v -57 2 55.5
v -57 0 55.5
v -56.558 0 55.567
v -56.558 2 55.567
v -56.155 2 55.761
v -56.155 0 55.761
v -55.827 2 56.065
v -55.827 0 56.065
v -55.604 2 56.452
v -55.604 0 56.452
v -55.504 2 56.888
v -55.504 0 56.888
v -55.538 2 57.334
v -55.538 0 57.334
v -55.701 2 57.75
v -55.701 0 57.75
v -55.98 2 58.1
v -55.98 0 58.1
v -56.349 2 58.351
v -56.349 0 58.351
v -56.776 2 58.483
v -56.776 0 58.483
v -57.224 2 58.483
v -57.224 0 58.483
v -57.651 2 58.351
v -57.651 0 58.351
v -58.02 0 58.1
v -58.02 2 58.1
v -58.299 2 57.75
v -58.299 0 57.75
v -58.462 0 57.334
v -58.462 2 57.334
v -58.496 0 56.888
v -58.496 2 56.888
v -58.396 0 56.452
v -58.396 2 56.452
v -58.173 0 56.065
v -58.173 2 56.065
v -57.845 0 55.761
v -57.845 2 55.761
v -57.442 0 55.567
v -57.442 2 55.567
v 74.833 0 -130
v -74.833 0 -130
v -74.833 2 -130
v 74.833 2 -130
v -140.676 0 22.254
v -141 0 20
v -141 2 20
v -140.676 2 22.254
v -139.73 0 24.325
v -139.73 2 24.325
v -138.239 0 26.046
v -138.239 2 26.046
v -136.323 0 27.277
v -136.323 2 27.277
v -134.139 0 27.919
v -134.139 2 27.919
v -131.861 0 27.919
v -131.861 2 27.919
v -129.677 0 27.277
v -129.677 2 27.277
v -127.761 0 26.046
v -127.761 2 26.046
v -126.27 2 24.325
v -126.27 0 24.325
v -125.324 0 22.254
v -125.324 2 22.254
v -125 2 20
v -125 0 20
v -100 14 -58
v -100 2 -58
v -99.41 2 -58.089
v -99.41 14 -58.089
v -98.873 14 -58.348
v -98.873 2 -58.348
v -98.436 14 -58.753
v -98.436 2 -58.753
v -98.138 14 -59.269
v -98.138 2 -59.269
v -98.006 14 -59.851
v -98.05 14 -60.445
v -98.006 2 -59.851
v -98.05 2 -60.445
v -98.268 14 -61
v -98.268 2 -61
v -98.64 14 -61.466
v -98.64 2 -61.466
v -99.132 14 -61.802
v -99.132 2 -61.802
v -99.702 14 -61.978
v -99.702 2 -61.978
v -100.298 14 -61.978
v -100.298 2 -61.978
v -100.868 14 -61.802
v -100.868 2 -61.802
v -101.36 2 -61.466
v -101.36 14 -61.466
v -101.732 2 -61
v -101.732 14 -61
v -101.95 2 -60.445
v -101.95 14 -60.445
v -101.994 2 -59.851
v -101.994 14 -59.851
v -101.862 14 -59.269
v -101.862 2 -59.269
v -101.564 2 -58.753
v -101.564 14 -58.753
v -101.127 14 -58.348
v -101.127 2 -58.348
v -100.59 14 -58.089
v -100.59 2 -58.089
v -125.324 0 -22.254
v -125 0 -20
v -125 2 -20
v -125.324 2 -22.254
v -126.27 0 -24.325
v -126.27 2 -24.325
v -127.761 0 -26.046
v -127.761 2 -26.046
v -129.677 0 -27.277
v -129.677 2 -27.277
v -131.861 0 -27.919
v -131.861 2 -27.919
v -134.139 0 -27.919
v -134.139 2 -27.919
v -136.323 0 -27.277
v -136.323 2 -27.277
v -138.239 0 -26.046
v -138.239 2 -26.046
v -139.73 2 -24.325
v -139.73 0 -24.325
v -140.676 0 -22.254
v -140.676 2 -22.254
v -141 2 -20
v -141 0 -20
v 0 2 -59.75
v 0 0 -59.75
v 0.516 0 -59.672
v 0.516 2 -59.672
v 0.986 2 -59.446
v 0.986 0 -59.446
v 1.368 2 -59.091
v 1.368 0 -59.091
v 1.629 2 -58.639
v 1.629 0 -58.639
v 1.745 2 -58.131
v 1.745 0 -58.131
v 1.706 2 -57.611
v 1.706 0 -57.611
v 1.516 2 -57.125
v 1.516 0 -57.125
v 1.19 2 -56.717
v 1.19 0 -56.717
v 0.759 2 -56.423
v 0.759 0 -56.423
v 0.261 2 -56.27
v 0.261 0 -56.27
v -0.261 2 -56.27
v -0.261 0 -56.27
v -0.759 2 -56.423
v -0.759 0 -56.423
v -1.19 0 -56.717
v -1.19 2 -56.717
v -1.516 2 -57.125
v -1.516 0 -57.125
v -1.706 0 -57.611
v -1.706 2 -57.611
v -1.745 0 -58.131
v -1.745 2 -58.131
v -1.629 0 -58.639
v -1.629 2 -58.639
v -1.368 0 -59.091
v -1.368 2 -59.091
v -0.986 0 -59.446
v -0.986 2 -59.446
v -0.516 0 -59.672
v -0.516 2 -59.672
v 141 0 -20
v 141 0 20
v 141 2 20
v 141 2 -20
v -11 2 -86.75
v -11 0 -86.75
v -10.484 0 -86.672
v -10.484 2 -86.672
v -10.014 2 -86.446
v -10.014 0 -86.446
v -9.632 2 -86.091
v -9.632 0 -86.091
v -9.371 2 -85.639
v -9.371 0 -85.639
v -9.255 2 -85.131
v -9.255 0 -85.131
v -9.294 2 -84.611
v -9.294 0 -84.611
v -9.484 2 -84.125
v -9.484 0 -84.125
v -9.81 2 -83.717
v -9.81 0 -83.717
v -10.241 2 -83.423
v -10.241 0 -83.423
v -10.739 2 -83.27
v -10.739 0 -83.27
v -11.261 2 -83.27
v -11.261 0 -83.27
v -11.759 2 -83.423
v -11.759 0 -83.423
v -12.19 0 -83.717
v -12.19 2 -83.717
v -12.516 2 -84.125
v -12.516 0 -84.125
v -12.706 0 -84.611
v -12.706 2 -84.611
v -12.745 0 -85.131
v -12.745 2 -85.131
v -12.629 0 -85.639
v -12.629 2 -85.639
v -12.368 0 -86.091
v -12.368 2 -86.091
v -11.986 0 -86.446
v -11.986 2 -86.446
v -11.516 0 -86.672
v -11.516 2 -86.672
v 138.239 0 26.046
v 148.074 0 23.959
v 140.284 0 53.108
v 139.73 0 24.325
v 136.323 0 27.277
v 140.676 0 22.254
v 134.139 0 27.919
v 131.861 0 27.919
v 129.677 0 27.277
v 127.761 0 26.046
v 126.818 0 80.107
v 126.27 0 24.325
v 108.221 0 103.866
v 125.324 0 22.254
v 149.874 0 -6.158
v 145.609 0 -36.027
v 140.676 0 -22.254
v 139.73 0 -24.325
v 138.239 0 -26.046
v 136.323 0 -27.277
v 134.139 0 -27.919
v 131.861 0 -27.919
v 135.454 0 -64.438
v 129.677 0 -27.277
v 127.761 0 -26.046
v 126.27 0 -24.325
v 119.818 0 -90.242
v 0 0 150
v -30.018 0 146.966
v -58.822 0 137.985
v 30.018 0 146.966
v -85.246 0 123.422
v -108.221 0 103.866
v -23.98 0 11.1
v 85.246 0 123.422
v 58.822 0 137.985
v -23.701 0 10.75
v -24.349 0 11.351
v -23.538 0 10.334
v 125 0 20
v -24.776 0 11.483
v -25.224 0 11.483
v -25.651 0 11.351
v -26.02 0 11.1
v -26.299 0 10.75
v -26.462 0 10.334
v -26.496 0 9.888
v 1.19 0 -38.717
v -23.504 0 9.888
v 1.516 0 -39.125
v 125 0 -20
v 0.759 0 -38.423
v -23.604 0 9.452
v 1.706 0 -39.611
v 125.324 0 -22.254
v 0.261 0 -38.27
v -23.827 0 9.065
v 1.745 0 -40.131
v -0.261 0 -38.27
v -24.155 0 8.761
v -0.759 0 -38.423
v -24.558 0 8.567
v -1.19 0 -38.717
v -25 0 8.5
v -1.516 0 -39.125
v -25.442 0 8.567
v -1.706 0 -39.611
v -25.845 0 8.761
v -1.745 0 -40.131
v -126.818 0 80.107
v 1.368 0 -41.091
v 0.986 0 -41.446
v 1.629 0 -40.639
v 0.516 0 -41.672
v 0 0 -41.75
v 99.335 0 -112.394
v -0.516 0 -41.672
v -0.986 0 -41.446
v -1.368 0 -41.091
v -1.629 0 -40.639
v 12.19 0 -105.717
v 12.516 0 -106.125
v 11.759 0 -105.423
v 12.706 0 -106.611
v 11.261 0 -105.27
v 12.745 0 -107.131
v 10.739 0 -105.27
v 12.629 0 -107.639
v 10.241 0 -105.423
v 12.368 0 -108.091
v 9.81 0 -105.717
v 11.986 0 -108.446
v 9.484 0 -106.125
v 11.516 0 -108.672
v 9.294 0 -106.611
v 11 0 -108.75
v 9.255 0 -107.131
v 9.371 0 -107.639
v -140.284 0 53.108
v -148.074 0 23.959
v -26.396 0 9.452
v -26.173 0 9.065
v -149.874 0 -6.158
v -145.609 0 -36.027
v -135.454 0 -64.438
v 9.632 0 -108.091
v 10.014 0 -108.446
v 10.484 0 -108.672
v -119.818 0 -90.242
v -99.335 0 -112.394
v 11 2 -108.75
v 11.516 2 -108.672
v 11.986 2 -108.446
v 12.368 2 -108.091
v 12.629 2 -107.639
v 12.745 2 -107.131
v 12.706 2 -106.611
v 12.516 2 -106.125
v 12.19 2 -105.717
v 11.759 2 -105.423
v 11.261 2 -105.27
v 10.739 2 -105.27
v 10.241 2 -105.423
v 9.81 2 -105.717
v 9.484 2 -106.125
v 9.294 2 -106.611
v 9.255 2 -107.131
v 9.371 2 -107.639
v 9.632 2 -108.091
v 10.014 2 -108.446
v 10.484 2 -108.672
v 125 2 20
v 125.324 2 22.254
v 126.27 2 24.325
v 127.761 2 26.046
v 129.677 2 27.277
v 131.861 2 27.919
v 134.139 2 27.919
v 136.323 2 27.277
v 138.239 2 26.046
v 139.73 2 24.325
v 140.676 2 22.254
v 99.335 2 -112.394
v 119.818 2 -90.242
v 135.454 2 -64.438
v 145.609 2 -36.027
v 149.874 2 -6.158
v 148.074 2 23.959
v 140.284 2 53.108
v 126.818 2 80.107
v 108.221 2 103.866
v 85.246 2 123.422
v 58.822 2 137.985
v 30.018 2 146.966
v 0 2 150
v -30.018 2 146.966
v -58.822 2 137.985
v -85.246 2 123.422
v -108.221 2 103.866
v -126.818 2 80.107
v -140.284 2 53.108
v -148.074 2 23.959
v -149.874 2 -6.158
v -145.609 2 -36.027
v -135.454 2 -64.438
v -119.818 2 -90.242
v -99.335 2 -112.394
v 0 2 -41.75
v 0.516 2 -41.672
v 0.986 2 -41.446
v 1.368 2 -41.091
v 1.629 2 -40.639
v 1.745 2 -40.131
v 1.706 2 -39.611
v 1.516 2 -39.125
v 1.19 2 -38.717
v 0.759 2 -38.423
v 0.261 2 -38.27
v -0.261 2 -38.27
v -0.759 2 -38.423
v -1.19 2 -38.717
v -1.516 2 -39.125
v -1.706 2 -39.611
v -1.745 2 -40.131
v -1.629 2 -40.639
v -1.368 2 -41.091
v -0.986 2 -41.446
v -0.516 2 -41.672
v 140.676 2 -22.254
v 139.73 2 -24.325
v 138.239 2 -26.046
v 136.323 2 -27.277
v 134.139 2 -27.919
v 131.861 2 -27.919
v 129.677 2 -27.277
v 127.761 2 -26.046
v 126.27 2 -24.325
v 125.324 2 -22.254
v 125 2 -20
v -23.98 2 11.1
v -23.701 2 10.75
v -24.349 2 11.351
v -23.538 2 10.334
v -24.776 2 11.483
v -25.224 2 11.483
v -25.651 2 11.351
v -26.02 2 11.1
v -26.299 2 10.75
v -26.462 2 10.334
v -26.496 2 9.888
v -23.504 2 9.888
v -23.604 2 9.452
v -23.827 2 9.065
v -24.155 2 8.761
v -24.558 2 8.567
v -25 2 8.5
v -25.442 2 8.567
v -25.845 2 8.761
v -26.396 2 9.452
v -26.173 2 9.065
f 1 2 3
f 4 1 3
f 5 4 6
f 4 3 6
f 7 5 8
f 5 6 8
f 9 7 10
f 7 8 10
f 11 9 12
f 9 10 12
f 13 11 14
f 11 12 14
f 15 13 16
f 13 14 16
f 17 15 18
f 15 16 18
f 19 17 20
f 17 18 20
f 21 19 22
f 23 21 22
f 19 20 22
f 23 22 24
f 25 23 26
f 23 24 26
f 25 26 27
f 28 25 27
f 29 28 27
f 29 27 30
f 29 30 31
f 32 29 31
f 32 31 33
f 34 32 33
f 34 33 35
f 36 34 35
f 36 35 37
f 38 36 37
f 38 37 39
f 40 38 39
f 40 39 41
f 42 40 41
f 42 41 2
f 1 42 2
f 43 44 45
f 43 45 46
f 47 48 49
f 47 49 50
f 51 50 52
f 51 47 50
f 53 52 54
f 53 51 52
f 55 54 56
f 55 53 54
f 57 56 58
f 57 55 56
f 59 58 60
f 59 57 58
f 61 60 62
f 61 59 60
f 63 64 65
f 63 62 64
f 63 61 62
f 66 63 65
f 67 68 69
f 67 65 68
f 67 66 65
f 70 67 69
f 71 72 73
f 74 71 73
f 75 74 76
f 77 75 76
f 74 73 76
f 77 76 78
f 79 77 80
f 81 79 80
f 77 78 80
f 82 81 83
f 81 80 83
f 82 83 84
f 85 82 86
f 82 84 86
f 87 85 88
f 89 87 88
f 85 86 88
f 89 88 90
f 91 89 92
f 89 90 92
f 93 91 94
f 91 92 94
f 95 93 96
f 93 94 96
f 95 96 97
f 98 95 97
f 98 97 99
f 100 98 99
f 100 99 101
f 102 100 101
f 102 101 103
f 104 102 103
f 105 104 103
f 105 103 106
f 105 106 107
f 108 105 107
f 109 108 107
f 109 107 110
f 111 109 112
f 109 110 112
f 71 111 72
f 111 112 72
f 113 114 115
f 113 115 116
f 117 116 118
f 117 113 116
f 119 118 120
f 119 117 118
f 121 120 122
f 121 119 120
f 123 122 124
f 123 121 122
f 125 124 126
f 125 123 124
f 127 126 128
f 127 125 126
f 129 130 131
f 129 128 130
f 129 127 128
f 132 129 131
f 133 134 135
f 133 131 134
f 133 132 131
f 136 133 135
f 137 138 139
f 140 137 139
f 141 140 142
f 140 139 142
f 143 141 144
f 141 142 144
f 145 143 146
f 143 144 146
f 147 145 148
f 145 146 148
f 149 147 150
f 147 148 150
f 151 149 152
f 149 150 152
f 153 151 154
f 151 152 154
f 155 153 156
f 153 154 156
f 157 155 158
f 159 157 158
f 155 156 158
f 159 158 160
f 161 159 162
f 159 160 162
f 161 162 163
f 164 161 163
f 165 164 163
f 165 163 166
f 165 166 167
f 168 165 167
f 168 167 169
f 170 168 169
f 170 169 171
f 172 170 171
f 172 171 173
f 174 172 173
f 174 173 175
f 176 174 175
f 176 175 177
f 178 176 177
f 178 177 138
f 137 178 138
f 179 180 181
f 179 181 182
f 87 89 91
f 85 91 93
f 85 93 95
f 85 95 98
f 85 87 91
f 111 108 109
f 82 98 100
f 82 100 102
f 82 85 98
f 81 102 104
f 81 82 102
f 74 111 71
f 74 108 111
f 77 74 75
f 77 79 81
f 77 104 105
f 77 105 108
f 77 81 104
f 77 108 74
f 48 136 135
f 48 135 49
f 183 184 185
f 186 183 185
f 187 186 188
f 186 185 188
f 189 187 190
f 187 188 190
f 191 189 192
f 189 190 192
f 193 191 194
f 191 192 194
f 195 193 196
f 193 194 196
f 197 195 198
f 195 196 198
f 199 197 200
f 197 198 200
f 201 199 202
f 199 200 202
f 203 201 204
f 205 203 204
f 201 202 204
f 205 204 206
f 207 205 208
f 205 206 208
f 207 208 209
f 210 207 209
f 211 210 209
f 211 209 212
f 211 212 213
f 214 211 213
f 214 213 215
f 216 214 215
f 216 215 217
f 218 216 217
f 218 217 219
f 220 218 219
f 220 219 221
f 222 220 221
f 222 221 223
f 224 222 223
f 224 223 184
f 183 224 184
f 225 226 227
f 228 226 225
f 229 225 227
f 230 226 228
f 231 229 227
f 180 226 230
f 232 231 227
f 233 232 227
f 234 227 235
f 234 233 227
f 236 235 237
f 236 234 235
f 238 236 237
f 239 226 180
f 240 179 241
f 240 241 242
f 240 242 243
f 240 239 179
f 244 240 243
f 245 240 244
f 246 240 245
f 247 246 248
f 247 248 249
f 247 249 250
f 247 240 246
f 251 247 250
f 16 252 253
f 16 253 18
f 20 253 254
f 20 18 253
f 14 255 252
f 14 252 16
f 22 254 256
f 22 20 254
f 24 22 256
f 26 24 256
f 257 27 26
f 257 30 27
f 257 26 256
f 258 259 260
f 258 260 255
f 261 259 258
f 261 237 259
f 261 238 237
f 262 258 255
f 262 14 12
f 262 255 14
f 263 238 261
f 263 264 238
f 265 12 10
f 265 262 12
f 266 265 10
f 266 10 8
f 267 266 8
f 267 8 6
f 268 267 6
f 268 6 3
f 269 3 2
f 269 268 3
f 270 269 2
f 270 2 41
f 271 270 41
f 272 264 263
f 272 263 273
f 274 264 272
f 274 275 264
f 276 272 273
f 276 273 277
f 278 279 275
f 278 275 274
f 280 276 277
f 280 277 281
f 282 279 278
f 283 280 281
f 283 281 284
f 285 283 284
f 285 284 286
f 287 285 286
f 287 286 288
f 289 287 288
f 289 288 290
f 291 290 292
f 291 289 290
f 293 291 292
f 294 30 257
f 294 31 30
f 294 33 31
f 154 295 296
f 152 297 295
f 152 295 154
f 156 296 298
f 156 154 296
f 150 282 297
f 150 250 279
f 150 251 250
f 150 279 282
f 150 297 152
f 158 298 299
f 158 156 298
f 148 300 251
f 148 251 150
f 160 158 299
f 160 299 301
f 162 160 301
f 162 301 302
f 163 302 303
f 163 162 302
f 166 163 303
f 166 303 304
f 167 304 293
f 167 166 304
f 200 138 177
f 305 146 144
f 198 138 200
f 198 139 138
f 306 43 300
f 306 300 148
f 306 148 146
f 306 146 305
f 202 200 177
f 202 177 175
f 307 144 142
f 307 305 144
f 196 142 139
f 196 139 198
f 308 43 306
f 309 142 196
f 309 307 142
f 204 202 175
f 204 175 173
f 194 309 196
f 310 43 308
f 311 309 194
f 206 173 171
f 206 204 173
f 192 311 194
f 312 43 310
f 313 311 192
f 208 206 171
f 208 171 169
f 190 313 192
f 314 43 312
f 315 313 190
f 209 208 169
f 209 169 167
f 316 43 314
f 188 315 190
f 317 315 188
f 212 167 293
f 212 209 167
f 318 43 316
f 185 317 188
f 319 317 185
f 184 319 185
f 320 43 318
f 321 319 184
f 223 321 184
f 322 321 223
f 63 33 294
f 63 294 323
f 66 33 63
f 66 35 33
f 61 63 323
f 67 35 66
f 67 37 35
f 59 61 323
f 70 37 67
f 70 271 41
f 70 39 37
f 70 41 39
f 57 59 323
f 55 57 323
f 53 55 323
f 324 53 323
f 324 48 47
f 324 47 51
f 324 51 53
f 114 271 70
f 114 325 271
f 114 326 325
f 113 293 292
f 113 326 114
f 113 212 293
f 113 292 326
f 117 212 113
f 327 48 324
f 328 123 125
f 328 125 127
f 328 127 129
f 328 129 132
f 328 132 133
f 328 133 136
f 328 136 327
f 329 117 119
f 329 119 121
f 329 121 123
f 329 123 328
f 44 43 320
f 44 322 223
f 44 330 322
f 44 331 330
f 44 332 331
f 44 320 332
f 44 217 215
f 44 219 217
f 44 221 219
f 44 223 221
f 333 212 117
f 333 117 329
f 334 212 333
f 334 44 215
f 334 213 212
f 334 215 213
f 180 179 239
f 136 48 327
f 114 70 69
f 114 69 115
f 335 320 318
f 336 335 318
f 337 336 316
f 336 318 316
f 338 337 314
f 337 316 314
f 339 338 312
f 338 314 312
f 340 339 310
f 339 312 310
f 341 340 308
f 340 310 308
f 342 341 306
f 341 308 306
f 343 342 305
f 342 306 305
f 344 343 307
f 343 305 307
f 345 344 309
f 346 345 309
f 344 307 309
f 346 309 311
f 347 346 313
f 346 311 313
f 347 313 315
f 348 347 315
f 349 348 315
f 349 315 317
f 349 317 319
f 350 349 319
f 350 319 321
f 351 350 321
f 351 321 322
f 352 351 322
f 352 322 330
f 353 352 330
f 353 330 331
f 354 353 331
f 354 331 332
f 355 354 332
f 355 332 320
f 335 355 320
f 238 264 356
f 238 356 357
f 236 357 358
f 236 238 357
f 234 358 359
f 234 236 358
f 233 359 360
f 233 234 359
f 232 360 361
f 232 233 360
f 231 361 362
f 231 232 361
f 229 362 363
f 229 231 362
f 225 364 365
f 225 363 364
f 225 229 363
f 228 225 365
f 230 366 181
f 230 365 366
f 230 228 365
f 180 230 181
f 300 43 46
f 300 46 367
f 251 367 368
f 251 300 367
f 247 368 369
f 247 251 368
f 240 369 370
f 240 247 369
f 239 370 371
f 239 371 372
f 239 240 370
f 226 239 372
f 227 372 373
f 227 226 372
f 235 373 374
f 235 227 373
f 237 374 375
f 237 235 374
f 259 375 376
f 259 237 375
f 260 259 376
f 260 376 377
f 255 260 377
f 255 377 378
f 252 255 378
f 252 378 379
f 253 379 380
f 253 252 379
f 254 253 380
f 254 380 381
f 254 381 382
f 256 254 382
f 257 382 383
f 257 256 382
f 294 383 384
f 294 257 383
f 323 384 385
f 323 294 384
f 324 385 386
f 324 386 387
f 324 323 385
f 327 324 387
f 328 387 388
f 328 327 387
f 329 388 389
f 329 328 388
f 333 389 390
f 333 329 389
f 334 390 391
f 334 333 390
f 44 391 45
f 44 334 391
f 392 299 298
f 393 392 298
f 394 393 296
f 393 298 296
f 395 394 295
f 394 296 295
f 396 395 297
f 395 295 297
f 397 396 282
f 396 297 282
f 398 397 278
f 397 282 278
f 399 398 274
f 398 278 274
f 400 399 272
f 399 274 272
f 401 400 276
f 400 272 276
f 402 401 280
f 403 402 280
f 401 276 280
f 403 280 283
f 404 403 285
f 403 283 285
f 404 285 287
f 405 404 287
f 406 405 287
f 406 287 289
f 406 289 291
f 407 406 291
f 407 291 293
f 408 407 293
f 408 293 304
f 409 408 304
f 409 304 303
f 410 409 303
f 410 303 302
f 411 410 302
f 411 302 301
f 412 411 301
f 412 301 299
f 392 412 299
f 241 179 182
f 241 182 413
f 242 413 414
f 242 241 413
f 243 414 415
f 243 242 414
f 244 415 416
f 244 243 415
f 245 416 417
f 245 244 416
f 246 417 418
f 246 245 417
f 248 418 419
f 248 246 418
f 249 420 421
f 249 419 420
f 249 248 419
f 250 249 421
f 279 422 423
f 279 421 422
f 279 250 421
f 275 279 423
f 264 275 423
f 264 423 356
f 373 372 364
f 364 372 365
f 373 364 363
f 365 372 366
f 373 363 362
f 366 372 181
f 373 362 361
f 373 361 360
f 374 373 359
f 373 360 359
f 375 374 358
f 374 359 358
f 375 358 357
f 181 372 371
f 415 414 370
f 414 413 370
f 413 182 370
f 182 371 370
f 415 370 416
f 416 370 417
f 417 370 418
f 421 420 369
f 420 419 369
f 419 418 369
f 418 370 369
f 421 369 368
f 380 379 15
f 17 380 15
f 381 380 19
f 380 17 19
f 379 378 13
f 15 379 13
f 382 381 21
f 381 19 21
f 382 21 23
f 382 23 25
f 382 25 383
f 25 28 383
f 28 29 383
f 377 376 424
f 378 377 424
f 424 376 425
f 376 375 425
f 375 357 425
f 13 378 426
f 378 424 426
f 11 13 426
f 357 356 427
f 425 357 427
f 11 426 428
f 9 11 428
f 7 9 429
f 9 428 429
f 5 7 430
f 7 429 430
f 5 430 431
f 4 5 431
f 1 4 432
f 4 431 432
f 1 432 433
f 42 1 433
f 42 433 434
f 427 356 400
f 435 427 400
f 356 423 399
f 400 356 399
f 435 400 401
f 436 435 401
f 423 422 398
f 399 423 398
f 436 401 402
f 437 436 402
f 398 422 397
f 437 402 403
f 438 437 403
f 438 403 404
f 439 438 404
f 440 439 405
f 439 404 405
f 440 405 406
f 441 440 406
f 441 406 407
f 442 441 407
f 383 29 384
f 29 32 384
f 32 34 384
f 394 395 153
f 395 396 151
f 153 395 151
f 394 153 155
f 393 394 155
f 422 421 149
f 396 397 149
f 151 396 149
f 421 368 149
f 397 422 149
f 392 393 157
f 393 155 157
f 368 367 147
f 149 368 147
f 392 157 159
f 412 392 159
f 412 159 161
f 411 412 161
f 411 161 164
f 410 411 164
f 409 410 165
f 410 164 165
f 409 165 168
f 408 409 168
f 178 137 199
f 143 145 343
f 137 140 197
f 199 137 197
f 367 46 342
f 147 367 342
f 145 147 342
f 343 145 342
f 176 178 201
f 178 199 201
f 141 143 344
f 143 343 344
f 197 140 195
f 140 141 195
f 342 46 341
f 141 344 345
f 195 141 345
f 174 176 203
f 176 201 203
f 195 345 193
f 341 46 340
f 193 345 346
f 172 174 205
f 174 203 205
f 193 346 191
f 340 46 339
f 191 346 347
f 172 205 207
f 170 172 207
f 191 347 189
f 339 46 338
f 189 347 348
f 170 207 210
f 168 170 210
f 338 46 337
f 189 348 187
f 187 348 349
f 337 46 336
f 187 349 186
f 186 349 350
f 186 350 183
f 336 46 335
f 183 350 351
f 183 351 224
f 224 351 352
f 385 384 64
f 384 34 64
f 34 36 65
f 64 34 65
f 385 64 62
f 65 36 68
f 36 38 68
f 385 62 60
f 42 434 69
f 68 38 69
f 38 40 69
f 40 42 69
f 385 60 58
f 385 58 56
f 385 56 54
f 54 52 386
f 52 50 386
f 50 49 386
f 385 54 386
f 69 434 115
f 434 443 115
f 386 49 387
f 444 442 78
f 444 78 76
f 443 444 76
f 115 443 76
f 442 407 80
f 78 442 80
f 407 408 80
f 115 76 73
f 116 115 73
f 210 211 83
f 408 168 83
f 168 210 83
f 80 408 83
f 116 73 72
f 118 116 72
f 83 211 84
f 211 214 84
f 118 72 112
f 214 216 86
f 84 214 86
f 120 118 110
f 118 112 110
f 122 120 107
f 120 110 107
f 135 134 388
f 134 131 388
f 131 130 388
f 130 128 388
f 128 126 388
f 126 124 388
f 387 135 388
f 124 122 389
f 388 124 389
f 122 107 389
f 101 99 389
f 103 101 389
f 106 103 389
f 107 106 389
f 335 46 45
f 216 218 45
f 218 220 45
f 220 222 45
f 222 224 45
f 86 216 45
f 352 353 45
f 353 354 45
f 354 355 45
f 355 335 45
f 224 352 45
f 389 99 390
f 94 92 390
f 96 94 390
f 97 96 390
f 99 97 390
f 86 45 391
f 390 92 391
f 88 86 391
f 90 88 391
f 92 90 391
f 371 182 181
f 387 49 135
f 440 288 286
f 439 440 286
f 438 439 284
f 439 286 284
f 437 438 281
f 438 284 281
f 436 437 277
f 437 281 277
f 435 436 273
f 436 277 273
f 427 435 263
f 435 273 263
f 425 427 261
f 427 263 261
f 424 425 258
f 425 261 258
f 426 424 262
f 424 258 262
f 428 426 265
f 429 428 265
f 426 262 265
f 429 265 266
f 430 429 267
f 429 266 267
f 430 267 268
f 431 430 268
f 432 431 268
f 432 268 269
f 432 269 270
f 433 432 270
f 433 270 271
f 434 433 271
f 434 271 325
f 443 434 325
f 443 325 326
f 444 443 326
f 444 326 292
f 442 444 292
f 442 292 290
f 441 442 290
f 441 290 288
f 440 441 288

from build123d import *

# Parameters (mm, degrees)
BOSS_EXTRU_1_DEPTH      = 2
ESQUISSE3_R             = 1.5
ESQUISSE3_R_2           = 1.75
ENL_V_MAT_EXTRU_1_DEPTH = 213.141462237
ESQUISSE4_R             = 2
GOUJON_M4X12_DEPTH      = 12


with BuildPart() as part:
    # Esquisse2 → Boss.-Extru.1 (new body)
    with BuildSketch(Plane(origin=(0, 0, 0), x_dir=(1, 0, 0), z_dir=(0, 1, 0))):
        with BuildLine():
            Line((-74.833147735, 130), (74.833147735, 130))
            ThreePointArc((74.833147735, 130), (0, -150), (-74.833147735, 130))
        make_face()
    extrude(amount=BOSS_EXTRU_1_DEPTH)

    # Esquisse3 → Enlèv. mat.-Extru.1 (cut, through all)
    with BuildSketch(Plane(origin=(0, 0, 0), x_dir=(-1, 0, 0), z_dir=(0, -1, 0))):
        with Locations((25, -10)):
            Circle(ESQUISSE3_R)
        with Locations((57, -57)):
            Circle(ESQUISSE3_R)
        with Locations((0, 40)):
            Circle(ESQUISSE3_R_2)
        with Locations((0, 58)):
            Circle(ESQUISSE3_R_2)
        with Locations((-11, 107)):
            Circle(ESQUISSE3_R_2)
        with Locations((11, 85)):
            Circle(ESQUISSE3_R_2)
        with BuildLine():
            Line((125, -20), (125, 20))
            ThreePointArc((125, 20), (133, 28), (141, 20))
            Line((141, 20), (141, -20))
            ThreePointArc((141, -20), (133, -28), (125, -20))
        make_face()
        with BuildLine():
            Line((-141, -20), (-141, 20))
            ThreePointArc((-141, 20), (-133, 28), (-125, 20))
            Line((-125, 20), (-125, -20))
            ThreePointArc((-125, -20), (-133, -28), (-141, -20))
        make_face()
    extrude(amount=-ENL_V_MAT_EXTRU_1_DEPTH, mode=Mode.SUBTRACT)

    # Esquisse4 → Goujon M4x12 (add)
    with BuildSketch(Plane(origin=(0, 2, 0), x_dir=(1, 0, 0), z_dir=(0, 1, 0))):
        with Locations((-100, 60)):
            Circle(ESQUISSE4_R)
    extrude(amount=GOUJON_M4X12_DEPTH)


solid = part.part
